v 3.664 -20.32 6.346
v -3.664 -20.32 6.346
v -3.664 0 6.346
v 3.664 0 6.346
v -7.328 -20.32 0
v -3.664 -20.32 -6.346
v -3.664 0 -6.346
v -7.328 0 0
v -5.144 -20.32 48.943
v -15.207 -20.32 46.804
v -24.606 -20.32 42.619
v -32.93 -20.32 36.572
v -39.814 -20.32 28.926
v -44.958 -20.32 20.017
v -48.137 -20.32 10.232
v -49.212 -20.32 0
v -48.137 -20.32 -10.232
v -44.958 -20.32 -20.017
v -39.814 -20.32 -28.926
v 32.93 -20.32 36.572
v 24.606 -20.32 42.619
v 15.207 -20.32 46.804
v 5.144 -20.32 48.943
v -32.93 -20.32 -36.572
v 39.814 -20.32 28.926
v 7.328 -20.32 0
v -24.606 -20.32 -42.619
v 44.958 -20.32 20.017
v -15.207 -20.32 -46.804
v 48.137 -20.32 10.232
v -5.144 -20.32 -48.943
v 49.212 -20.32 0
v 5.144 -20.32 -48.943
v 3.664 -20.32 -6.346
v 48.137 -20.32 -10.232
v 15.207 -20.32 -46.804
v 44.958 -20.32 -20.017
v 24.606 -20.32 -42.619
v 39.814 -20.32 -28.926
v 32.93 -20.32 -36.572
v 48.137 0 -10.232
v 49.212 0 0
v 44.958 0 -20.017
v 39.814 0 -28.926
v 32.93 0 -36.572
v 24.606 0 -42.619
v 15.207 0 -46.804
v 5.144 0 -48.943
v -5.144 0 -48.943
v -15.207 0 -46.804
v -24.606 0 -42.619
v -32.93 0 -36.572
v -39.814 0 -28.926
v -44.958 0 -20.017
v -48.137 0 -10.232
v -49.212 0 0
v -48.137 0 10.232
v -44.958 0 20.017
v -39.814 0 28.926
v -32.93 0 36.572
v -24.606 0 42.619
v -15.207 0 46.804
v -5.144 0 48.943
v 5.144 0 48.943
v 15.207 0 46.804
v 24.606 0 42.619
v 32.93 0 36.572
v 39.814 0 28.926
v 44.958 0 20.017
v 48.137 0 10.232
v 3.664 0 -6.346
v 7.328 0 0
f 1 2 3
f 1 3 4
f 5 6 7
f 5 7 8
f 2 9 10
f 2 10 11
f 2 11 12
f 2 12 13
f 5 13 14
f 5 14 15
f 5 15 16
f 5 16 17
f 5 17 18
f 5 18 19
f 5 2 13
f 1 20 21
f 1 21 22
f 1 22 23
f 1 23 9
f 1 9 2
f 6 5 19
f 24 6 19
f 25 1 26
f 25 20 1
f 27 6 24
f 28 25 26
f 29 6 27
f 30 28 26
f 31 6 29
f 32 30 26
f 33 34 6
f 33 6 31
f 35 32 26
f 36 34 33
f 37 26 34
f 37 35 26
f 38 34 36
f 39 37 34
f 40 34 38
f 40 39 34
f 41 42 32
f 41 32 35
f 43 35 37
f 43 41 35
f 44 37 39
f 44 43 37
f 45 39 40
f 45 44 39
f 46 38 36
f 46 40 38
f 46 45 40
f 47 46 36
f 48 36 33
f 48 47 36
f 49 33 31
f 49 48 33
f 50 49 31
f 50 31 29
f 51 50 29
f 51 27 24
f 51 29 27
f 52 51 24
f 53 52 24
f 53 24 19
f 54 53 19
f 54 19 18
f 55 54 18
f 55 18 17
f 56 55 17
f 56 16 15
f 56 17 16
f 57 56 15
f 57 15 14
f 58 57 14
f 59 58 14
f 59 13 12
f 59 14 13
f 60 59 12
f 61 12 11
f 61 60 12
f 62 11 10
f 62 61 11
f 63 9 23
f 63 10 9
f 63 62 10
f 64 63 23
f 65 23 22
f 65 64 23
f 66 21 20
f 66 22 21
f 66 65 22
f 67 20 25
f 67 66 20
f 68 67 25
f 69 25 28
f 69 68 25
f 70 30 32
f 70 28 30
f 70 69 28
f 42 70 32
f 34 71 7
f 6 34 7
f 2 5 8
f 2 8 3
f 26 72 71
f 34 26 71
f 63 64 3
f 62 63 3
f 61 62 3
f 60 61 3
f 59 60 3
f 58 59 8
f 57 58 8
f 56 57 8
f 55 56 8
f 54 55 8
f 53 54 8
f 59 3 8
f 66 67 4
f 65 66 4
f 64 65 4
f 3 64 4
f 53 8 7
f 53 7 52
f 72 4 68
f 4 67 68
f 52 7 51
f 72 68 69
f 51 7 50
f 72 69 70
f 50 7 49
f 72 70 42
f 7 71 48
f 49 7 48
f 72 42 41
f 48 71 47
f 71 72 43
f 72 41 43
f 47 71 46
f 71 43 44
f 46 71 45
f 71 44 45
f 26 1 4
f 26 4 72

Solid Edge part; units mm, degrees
sketch "Sketch1" plane through (0, 0, 0) normal (0, -1, 0) x (1, 0, 0)
  circle A0 centre (0, 0) radius 49.2125
extrude "Protrusion1" add sketch "Sketch1" along normal blind 20.32
sketch "Sketch2" plane through (0, -20.32, 0) normal (0, -1, 0) x (1, 0, 0)
  line L0 (-3.6639, 6.3461) -> (3.6639, 6.3461)
  line L1 (3.6639, 6.3461) -> (7.3279, 0)
  line L2 (7.3279, 0) -> (3.664, -6.3461)
  line L3 (3.664, -6.3461) -> (-3.6639, -6.3461)
  line L4 (-3.6639, -6.3461) -> (-7.3279, 0)
  line L5 (-7.3279, 0) -> (-3.6639, 6.3461)
  dimension "D1" = 14.6558
extrude "Cutout1" cut sketch "Sketch2" against normal up to next
